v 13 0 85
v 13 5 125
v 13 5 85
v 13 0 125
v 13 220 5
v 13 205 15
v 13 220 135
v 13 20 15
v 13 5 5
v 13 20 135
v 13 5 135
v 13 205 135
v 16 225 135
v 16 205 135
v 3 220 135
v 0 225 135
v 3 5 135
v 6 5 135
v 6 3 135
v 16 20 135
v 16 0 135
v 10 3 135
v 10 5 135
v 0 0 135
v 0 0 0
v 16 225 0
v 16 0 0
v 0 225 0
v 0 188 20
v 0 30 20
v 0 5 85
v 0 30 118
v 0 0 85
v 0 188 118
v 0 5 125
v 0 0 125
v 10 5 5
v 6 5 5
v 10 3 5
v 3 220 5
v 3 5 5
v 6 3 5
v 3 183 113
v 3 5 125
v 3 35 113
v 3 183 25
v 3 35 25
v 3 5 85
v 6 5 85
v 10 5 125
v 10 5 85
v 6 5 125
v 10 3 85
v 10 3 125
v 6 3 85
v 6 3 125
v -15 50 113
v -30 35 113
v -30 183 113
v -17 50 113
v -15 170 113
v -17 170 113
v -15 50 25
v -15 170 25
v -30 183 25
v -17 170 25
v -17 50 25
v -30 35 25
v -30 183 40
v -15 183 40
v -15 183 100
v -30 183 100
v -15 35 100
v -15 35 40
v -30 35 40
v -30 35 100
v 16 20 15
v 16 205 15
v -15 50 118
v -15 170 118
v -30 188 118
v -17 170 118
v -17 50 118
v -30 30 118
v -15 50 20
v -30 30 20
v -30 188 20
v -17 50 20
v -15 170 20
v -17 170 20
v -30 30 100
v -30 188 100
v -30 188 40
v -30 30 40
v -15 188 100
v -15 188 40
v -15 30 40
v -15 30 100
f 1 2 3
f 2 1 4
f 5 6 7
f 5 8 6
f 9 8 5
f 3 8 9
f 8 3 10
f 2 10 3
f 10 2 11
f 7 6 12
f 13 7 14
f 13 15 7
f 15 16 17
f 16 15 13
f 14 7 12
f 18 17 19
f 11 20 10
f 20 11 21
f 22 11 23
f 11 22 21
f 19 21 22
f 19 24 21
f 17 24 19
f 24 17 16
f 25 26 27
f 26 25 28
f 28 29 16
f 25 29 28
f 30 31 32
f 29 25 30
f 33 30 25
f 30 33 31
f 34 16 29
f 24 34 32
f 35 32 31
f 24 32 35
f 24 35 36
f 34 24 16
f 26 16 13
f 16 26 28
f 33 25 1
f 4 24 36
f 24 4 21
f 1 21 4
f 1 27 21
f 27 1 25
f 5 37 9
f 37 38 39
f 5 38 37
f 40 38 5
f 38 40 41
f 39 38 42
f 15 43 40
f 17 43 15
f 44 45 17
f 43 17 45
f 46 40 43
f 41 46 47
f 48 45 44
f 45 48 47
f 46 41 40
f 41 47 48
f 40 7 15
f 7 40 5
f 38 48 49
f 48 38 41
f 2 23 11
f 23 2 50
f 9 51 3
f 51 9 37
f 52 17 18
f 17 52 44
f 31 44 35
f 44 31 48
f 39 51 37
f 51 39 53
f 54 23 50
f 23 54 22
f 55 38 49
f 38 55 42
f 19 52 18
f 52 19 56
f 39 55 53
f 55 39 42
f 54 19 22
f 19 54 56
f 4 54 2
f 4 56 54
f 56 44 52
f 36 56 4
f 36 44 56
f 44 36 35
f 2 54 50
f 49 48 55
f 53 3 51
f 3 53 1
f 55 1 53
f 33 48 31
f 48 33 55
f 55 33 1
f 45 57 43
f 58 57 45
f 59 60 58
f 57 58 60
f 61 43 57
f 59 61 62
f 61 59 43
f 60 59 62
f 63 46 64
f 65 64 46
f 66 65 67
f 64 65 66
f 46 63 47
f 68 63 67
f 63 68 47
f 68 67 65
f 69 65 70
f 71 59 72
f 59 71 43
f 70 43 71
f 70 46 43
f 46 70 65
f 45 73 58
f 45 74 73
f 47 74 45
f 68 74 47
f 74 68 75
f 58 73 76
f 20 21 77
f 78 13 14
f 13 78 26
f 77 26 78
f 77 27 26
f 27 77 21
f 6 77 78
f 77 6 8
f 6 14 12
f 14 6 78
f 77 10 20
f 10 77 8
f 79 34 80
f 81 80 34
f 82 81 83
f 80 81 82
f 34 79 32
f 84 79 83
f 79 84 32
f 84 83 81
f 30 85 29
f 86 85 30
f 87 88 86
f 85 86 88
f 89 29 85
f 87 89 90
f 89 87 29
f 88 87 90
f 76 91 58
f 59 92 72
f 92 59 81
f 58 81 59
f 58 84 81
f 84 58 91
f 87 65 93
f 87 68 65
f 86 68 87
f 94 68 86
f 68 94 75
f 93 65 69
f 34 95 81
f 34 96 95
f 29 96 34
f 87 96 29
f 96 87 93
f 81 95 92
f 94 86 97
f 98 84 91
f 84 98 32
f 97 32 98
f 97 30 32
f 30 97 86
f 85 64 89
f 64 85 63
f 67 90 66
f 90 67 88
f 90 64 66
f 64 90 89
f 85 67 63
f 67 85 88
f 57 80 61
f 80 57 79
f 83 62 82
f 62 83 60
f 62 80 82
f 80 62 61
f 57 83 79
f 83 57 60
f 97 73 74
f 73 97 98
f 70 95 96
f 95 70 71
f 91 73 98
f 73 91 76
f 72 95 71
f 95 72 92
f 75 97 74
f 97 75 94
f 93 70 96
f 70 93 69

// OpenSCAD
union(){
    difference(){
        cube([13,225, 135]);
        translate([3,5,5]){
            cube([11,215,140]);
        }
        translate([6,3,5]){
            cube([4,3,140]);
        }
        //volume cutout
        translate([0,0,85]){
            cube([13,5,40]);
        }
        translate([0,35,25]){
            cube([5,148,88]);
        }
    }
    translate([13,0,0]){
        difference(){
            cube([3,225,135]);
            translate([0,20,15]){
                cube([4,185,135]);
            }
        }
    }
    //back
    difference(){
        translate([-30,30,20]){
            cube([30,158,98]);
        }
        translate([-30,35,25]){
            cube([30,148,88]);
        }
        
        translate([-17,50,20]){
            cube([2,120,5]);
        }
        translate([-17,50,113]){
            cube([2,120,5]);
        }
        
        translate([-30,30,40]){
            cube([15,160,60]);
        }
    }
}
